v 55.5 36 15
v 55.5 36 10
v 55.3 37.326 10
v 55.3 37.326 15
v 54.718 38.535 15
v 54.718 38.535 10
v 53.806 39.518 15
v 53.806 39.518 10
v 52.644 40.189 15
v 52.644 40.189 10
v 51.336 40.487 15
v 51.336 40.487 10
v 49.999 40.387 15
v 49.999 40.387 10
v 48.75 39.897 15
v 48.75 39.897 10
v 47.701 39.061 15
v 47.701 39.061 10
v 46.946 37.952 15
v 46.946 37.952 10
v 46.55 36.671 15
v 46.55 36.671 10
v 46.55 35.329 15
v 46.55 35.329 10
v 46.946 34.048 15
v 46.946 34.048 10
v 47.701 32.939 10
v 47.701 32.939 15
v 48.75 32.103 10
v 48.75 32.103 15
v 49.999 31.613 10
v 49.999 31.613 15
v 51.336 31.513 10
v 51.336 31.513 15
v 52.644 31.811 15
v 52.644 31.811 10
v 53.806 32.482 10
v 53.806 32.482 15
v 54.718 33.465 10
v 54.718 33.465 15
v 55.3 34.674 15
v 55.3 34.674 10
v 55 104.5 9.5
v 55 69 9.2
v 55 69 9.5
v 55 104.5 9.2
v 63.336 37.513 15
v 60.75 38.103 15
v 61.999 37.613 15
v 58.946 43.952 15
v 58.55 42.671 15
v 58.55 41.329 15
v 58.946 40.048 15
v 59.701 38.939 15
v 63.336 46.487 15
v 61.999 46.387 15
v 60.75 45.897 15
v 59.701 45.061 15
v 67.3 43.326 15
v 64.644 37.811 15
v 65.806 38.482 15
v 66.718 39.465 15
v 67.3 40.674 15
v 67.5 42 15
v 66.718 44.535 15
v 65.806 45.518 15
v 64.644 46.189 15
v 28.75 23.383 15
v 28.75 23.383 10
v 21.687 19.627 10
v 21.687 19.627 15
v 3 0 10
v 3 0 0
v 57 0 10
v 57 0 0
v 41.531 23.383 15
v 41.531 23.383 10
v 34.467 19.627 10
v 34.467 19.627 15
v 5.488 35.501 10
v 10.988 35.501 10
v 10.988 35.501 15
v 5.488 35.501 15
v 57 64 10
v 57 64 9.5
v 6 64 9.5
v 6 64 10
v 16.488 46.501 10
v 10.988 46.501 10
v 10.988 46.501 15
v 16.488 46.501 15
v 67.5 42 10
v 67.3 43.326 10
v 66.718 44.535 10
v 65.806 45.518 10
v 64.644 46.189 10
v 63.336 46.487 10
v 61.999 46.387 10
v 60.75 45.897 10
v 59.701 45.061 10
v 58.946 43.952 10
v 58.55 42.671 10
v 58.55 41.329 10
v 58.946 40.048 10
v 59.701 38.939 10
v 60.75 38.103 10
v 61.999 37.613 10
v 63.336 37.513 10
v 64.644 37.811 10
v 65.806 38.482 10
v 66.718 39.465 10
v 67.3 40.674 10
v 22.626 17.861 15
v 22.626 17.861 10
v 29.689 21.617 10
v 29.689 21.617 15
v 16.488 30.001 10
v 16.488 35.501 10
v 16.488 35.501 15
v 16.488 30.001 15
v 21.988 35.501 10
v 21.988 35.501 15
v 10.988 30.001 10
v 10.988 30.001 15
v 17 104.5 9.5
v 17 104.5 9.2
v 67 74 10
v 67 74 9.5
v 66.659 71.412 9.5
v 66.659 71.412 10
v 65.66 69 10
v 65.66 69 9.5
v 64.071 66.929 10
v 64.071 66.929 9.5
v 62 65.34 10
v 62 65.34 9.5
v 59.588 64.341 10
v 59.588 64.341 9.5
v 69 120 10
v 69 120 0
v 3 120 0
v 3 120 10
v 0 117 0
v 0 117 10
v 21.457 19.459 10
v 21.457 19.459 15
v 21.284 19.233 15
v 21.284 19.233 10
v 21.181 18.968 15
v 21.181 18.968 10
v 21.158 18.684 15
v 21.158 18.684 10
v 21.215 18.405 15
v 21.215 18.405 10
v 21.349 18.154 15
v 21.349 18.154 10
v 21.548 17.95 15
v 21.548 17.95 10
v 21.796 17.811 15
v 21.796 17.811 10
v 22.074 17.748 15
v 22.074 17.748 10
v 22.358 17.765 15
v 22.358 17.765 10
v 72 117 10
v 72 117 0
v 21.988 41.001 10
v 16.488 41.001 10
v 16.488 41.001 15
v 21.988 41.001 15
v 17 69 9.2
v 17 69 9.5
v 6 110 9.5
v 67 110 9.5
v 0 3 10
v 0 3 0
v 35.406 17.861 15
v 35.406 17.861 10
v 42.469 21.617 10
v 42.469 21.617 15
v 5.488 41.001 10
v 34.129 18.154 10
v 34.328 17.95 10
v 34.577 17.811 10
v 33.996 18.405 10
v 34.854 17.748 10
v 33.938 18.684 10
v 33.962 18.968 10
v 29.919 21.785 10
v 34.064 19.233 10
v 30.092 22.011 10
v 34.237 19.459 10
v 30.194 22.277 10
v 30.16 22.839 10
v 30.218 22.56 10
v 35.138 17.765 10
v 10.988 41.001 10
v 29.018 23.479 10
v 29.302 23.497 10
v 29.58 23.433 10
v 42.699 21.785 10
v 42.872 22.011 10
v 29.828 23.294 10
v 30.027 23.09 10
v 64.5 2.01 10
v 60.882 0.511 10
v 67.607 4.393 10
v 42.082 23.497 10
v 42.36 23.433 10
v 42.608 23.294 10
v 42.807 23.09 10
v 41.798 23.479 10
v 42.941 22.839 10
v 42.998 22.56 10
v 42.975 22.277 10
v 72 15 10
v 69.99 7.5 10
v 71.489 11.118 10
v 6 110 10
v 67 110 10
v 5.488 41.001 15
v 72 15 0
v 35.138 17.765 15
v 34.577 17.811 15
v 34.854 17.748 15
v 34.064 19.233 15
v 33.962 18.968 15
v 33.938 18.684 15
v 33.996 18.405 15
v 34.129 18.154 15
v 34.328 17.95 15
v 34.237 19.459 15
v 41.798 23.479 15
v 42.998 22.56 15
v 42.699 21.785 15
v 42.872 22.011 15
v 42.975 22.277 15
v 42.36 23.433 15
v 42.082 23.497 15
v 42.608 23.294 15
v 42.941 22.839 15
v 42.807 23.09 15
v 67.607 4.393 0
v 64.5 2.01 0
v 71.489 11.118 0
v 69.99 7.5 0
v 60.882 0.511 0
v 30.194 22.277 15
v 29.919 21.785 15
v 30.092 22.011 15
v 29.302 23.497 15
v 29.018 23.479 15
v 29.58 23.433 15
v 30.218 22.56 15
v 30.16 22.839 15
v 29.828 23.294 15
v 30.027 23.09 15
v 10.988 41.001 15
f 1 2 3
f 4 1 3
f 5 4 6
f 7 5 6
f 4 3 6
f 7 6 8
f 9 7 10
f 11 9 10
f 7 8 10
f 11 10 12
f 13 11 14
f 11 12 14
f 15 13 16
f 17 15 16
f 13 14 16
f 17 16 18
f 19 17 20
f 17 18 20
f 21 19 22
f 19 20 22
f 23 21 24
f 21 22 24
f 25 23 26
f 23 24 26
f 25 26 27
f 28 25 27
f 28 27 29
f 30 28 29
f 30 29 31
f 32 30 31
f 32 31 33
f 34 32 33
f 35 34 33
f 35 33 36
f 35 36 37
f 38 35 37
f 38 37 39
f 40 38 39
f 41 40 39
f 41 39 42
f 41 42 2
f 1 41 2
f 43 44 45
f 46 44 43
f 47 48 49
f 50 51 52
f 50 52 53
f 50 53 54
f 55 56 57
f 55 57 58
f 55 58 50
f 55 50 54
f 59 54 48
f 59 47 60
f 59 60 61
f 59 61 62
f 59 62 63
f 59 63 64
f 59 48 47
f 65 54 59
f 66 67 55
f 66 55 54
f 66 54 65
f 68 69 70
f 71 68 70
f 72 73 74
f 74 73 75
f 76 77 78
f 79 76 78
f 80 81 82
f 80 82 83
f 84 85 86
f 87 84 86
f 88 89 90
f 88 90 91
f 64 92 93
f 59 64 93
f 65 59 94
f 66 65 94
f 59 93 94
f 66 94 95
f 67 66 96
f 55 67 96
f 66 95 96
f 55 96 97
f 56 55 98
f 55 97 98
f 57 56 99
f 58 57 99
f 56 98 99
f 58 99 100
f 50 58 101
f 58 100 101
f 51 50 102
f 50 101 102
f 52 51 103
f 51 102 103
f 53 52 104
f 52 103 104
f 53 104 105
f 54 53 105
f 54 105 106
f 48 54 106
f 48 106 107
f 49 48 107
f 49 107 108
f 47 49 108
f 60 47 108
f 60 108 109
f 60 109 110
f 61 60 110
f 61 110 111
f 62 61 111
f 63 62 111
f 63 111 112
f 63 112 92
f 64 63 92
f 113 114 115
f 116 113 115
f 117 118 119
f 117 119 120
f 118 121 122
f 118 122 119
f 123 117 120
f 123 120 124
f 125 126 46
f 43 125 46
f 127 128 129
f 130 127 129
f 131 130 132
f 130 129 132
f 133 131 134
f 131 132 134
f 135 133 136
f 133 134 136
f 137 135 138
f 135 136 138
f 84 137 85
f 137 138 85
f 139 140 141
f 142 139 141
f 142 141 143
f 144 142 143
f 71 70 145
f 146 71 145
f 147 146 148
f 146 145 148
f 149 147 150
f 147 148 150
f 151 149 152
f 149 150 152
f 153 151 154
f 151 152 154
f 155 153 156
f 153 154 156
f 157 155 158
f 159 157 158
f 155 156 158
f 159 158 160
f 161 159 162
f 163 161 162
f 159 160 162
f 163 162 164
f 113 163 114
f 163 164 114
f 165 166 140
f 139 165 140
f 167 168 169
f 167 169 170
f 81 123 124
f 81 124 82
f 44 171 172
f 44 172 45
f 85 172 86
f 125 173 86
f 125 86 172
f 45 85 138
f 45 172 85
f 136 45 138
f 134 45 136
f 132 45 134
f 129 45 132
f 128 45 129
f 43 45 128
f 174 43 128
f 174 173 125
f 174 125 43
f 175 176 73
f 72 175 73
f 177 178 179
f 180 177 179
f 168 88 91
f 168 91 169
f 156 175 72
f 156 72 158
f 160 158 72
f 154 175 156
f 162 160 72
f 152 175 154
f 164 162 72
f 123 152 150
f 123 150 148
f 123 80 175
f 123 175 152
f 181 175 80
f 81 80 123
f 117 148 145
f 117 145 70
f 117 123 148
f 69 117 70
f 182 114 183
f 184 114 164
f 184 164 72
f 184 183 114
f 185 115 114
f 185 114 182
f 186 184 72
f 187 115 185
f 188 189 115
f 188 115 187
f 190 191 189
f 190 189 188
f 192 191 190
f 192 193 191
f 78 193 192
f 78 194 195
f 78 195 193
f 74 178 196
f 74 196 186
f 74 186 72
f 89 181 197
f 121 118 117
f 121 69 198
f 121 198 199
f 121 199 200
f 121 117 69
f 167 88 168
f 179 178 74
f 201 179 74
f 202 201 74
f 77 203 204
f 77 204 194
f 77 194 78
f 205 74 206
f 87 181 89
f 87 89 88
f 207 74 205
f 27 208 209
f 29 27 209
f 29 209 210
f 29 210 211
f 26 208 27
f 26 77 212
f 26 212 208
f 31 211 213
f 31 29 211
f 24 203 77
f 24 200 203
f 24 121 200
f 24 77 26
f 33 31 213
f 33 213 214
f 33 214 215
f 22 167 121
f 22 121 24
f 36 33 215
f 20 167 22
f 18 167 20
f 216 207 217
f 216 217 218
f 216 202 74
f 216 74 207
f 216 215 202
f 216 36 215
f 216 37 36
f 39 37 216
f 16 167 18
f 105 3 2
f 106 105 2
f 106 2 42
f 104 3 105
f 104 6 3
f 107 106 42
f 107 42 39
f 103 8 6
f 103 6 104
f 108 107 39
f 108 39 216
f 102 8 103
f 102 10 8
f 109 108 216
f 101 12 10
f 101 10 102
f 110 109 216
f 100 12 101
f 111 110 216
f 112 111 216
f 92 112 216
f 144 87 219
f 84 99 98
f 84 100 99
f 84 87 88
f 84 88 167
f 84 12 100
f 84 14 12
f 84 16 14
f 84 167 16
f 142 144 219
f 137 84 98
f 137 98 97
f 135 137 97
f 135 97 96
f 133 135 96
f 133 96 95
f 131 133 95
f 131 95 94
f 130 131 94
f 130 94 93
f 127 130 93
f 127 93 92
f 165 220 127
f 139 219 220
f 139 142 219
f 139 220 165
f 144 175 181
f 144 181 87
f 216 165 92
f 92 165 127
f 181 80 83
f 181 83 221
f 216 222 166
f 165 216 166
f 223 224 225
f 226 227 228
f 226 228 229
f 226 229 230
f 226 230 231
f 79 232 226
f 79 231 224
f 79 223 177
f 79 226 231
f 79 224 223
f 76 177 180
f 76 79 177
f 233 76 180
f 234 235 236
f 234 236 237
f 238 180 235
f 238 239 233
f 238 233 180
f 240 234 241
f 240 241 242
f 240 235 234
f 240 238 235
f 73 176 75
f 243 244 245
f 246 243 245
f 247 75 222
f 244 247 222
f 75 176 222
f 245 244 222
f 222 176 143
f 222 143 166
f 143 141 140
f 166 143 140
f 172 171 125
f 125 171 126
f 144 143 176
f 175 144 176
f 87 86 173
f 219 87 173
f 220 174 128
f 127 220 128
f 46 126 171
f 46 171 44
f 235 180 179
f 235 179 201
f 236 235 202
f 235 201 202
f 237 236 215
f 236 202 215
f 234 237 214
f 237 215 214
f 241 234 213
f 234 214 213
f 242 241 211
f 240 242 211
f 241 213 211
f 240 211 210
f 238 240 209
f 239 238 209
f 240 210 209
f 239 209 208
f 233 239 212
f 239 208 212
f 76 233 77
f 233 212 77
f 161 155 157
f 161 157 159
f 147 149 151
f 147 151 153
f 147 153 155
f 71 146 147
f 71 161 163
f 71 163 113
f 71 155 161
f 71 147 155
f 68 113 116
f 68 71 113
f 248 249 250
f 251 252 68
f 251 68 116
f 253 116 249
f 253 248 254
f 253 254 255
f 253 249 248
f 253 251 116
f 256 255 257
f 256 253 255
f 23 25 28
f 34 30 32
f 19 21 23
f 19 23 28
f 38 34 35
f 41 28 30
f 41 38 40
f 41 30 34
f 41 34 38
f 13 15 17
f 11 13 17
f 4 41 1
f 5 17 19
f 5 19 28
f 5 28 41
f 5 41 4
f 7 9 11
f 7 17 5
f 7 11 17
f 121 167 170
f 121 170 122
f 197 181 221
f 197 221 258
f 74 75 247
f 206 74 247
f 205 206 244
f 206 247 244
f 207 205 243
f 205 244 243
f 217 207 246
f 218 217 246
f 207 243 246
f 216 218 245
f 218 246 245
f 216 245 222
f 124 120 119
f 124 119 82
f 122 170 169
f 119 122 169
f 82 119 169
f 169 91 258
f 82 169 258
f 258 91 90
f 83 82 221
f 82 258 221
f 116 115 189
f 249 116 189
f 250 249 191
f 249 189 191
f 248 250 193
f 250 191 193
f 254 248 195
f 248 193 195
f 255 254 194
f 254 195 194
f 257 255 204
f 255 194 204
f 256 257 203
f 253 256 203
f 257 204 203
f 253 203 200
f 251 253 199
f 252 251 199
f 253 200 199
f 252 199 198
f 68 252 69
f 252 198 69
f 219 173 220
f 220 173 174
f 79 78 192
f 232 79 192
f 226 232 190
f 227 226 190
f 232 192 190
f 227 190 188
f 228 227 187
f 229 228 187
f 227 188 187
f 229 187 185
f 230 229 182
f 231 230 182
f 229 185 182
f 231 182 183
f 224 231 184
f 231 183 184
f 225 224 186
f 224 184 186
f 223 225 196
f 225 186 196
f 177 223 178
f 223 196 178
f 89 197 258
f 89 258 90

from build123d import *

# Parameters (mm, degrees)
SKETCH_1_R       = 4.5
EXTRUDE_10_DEPTH = 10
SKETCH_1_15_W    = 38
SKETCH_1_15_H    = 35.5
EXTRUDE_11_DEPTH = 9.5
SKETCH_1_16_W    = 38
SKETCH_1_16_H    = 35.5
EXTRUDE_12_DEPTH = 9.2
SKETCH_1_17_R    = 4.5
EXTRUDE_13_DEPTH = 15


with BuildPart() as part:
    # 草图1 → 凸台-拉伸10 (new body)
    with BuildSketch(Plane.XY):
        with BuildLine():
            Line((0, 117), (0, 3))
            Line((0, 3), (3, 0))
            Line((3, 0), (57, 0))
            ThreePointArc((57, 0), (67.606601718, 4.393398282), (72, 15))
            Line((72, 15), (72, 22.5))
            Line((72, 22.5), (72, 42))
            Line((72, 42), (72, 117))
            Line((72, 117), (69, 120))
            Line((69, 120), (3, 120))
            Line((3, 120), (0, 117))
        make_face()
        with BuildLine():
            ThreePointArc((22.625564011, 17.861279905), (21.273144855, 18.274755935), (21.686620885, 19.627175091))
            Line((21.686620885, 19.627175091), (28.750201628, 23.382947593))
            ThreePointArc((28.750201628, 23.382947593), (30.102620784, 22.969471563), (29.689144754, 21.617052407))
            Line((29.689144754, 21.617052407), (22.625564011, 17.861279905))
        make_face(mode=Mode.SUBTRACT)
        Polygon((10.9884201, 41.001199035), (10.9884201, 46.501199035), (16.4884201, 46.501199035), (16.4884201, 41.001199035), (21.9884201, 41.001199035), (21.9884201, 35.501199035), (16.4884201, 35.501199035), (16.4884201, 30.001199035), (10.9884201, 30.001199035), (10.9884201, 35.501199035), (5.4884201, 35.501199035), (5.4884201, 41.001199035), align=None, mode=Mode.SUBTRACT)
        with BuildLine():
            ThreePointArc((41.530528437, 23.382947593), (42.882947593, 22.969471563), (42.469471563, 21.617052407))
            Line((42.469471563, 21.617052407), (35.40589082, 17.861279905))
            ThreePointArc((35.40589082, 17.861279905), (34.053471664, 18.274755935), (34.466947694, 19.627175091))
            Line((34.466947694, 19.627175091), (41.530528437, 23.382947593))
        make_face(mode=Mode.SUBTRACT)
        with Locations((51, 36)):
            Circle(SKETCH_1_R, mode=Mode.SUBTRACT)
        with Locations((63, 42)):
            Circle(SKETCH_1_R, mode=Mode.SUBTRACT)
        with BuildLine():
            Line((6, 70.706412031), (6, 110))
            Line((6, 110), (67, 110))
            Line((67, 110), (67, 74))
            ThreePointArc((67, 74), (64.071067812, 66.928932188), (57, 64))
            Line((57, 64), (17, 64))
            Line((17, 64), (6, 64))
            Line((6, 64), (6, 70.706412031))
        make_face(mode=Mode.SUBTRACT)
    extrude(amount=EXTRUDE_10_DEPTH)

    # 草图1<15> → 凸台-拉伸11 (add)
    with BuildSketch(Plane.XY):
        with BuildLine():
            Line((67, 110), (6, 110))
            Line((6, 110), (6, 70.706412031))
            Line((6, 70.706412031), (6, 64))
            Line((6, 64), (17, 64))
            Line((17, 64), (57, 64))
            ThreePointArc((57, 64), (64.071067812, 66.928932188), (67, 74))
            Line((67, 74), (67, 110))
        make_face()
        with Locations((36, 86.75)):
            Rectangle(SKETCH_1_15_W, SKETCH_1_15_H, mode=Mode.SUBTRACT)
    extrude(amount=EXTRUDE_11_DEPTH)

    # 草图1<16> → 凸台-拉伸12 (add)
    with BuildSketch(Plane.XY):
        with Locations((36, 86.75)):
            Rectangle(SKETCH_1_16_W, SKETCH_1_16_H)
    extrude(amount=EXTRUDE_12_DEPTH)

    # 草图1<17> → 凸台-拉伸13 (add)
    with BuildSketch(Plane.XY):
        Polygon((16.4884201, 46.501199035), (10.9884201, 46.501199035), (10.9884201, 41.001199035), (5.4884201, 41.001199035), (5.4884201, 35.501199035), (10.9884201, 35.501199035), (10.9884201, 30.001199035), (16.4884201, 30.001199035), (16.4884201, 35.501199035), (21.9884201, 35.501199035), (21.9884201, 41.001199035), (16.4884201, 41.001199035), align=None)
        with BuildLine():
            Line((35.40589082, 17.861279905), (42.469471563, 21.617052407))
            ThreePointArc((42.469471563, 21.617052407), (42.882947593, 22.969471563), (41.530528437, 23.382947593))
            Line((41.530528437, 23.382947593), (34.466947694, 19.627175091))
            ThreePointArc((34.466947694, 19.627175091), (34.053471664, 18.274755935), (35.40589082, 17.861279905))
        make_face()
        with BuildLine():
            Line((28.750201628, 23.382947593), (21.686620885, 19.627175091))
            ThreePointArc((21.686620885, 19.627175091), (21.273144855, 18.274755935), (22.625564011, 17.861279905))
            Line((22.625564011, 17.861279905), (29.689144754, 21.617052407))
            ThreePointArc((29.689144754, 21.617052407), (30.102620784, 22.969471563), (28.750201628, 23.382947593))
        make_face()
        with Locations((63, 42)):
            Circle(SKETCH_1_17_R)
        with Locations((51, 36)):
            Circle(SKETCH_1_17_R)
    extrude(amount=EXTRUDE_13_DEPTH)


solid = part.part
